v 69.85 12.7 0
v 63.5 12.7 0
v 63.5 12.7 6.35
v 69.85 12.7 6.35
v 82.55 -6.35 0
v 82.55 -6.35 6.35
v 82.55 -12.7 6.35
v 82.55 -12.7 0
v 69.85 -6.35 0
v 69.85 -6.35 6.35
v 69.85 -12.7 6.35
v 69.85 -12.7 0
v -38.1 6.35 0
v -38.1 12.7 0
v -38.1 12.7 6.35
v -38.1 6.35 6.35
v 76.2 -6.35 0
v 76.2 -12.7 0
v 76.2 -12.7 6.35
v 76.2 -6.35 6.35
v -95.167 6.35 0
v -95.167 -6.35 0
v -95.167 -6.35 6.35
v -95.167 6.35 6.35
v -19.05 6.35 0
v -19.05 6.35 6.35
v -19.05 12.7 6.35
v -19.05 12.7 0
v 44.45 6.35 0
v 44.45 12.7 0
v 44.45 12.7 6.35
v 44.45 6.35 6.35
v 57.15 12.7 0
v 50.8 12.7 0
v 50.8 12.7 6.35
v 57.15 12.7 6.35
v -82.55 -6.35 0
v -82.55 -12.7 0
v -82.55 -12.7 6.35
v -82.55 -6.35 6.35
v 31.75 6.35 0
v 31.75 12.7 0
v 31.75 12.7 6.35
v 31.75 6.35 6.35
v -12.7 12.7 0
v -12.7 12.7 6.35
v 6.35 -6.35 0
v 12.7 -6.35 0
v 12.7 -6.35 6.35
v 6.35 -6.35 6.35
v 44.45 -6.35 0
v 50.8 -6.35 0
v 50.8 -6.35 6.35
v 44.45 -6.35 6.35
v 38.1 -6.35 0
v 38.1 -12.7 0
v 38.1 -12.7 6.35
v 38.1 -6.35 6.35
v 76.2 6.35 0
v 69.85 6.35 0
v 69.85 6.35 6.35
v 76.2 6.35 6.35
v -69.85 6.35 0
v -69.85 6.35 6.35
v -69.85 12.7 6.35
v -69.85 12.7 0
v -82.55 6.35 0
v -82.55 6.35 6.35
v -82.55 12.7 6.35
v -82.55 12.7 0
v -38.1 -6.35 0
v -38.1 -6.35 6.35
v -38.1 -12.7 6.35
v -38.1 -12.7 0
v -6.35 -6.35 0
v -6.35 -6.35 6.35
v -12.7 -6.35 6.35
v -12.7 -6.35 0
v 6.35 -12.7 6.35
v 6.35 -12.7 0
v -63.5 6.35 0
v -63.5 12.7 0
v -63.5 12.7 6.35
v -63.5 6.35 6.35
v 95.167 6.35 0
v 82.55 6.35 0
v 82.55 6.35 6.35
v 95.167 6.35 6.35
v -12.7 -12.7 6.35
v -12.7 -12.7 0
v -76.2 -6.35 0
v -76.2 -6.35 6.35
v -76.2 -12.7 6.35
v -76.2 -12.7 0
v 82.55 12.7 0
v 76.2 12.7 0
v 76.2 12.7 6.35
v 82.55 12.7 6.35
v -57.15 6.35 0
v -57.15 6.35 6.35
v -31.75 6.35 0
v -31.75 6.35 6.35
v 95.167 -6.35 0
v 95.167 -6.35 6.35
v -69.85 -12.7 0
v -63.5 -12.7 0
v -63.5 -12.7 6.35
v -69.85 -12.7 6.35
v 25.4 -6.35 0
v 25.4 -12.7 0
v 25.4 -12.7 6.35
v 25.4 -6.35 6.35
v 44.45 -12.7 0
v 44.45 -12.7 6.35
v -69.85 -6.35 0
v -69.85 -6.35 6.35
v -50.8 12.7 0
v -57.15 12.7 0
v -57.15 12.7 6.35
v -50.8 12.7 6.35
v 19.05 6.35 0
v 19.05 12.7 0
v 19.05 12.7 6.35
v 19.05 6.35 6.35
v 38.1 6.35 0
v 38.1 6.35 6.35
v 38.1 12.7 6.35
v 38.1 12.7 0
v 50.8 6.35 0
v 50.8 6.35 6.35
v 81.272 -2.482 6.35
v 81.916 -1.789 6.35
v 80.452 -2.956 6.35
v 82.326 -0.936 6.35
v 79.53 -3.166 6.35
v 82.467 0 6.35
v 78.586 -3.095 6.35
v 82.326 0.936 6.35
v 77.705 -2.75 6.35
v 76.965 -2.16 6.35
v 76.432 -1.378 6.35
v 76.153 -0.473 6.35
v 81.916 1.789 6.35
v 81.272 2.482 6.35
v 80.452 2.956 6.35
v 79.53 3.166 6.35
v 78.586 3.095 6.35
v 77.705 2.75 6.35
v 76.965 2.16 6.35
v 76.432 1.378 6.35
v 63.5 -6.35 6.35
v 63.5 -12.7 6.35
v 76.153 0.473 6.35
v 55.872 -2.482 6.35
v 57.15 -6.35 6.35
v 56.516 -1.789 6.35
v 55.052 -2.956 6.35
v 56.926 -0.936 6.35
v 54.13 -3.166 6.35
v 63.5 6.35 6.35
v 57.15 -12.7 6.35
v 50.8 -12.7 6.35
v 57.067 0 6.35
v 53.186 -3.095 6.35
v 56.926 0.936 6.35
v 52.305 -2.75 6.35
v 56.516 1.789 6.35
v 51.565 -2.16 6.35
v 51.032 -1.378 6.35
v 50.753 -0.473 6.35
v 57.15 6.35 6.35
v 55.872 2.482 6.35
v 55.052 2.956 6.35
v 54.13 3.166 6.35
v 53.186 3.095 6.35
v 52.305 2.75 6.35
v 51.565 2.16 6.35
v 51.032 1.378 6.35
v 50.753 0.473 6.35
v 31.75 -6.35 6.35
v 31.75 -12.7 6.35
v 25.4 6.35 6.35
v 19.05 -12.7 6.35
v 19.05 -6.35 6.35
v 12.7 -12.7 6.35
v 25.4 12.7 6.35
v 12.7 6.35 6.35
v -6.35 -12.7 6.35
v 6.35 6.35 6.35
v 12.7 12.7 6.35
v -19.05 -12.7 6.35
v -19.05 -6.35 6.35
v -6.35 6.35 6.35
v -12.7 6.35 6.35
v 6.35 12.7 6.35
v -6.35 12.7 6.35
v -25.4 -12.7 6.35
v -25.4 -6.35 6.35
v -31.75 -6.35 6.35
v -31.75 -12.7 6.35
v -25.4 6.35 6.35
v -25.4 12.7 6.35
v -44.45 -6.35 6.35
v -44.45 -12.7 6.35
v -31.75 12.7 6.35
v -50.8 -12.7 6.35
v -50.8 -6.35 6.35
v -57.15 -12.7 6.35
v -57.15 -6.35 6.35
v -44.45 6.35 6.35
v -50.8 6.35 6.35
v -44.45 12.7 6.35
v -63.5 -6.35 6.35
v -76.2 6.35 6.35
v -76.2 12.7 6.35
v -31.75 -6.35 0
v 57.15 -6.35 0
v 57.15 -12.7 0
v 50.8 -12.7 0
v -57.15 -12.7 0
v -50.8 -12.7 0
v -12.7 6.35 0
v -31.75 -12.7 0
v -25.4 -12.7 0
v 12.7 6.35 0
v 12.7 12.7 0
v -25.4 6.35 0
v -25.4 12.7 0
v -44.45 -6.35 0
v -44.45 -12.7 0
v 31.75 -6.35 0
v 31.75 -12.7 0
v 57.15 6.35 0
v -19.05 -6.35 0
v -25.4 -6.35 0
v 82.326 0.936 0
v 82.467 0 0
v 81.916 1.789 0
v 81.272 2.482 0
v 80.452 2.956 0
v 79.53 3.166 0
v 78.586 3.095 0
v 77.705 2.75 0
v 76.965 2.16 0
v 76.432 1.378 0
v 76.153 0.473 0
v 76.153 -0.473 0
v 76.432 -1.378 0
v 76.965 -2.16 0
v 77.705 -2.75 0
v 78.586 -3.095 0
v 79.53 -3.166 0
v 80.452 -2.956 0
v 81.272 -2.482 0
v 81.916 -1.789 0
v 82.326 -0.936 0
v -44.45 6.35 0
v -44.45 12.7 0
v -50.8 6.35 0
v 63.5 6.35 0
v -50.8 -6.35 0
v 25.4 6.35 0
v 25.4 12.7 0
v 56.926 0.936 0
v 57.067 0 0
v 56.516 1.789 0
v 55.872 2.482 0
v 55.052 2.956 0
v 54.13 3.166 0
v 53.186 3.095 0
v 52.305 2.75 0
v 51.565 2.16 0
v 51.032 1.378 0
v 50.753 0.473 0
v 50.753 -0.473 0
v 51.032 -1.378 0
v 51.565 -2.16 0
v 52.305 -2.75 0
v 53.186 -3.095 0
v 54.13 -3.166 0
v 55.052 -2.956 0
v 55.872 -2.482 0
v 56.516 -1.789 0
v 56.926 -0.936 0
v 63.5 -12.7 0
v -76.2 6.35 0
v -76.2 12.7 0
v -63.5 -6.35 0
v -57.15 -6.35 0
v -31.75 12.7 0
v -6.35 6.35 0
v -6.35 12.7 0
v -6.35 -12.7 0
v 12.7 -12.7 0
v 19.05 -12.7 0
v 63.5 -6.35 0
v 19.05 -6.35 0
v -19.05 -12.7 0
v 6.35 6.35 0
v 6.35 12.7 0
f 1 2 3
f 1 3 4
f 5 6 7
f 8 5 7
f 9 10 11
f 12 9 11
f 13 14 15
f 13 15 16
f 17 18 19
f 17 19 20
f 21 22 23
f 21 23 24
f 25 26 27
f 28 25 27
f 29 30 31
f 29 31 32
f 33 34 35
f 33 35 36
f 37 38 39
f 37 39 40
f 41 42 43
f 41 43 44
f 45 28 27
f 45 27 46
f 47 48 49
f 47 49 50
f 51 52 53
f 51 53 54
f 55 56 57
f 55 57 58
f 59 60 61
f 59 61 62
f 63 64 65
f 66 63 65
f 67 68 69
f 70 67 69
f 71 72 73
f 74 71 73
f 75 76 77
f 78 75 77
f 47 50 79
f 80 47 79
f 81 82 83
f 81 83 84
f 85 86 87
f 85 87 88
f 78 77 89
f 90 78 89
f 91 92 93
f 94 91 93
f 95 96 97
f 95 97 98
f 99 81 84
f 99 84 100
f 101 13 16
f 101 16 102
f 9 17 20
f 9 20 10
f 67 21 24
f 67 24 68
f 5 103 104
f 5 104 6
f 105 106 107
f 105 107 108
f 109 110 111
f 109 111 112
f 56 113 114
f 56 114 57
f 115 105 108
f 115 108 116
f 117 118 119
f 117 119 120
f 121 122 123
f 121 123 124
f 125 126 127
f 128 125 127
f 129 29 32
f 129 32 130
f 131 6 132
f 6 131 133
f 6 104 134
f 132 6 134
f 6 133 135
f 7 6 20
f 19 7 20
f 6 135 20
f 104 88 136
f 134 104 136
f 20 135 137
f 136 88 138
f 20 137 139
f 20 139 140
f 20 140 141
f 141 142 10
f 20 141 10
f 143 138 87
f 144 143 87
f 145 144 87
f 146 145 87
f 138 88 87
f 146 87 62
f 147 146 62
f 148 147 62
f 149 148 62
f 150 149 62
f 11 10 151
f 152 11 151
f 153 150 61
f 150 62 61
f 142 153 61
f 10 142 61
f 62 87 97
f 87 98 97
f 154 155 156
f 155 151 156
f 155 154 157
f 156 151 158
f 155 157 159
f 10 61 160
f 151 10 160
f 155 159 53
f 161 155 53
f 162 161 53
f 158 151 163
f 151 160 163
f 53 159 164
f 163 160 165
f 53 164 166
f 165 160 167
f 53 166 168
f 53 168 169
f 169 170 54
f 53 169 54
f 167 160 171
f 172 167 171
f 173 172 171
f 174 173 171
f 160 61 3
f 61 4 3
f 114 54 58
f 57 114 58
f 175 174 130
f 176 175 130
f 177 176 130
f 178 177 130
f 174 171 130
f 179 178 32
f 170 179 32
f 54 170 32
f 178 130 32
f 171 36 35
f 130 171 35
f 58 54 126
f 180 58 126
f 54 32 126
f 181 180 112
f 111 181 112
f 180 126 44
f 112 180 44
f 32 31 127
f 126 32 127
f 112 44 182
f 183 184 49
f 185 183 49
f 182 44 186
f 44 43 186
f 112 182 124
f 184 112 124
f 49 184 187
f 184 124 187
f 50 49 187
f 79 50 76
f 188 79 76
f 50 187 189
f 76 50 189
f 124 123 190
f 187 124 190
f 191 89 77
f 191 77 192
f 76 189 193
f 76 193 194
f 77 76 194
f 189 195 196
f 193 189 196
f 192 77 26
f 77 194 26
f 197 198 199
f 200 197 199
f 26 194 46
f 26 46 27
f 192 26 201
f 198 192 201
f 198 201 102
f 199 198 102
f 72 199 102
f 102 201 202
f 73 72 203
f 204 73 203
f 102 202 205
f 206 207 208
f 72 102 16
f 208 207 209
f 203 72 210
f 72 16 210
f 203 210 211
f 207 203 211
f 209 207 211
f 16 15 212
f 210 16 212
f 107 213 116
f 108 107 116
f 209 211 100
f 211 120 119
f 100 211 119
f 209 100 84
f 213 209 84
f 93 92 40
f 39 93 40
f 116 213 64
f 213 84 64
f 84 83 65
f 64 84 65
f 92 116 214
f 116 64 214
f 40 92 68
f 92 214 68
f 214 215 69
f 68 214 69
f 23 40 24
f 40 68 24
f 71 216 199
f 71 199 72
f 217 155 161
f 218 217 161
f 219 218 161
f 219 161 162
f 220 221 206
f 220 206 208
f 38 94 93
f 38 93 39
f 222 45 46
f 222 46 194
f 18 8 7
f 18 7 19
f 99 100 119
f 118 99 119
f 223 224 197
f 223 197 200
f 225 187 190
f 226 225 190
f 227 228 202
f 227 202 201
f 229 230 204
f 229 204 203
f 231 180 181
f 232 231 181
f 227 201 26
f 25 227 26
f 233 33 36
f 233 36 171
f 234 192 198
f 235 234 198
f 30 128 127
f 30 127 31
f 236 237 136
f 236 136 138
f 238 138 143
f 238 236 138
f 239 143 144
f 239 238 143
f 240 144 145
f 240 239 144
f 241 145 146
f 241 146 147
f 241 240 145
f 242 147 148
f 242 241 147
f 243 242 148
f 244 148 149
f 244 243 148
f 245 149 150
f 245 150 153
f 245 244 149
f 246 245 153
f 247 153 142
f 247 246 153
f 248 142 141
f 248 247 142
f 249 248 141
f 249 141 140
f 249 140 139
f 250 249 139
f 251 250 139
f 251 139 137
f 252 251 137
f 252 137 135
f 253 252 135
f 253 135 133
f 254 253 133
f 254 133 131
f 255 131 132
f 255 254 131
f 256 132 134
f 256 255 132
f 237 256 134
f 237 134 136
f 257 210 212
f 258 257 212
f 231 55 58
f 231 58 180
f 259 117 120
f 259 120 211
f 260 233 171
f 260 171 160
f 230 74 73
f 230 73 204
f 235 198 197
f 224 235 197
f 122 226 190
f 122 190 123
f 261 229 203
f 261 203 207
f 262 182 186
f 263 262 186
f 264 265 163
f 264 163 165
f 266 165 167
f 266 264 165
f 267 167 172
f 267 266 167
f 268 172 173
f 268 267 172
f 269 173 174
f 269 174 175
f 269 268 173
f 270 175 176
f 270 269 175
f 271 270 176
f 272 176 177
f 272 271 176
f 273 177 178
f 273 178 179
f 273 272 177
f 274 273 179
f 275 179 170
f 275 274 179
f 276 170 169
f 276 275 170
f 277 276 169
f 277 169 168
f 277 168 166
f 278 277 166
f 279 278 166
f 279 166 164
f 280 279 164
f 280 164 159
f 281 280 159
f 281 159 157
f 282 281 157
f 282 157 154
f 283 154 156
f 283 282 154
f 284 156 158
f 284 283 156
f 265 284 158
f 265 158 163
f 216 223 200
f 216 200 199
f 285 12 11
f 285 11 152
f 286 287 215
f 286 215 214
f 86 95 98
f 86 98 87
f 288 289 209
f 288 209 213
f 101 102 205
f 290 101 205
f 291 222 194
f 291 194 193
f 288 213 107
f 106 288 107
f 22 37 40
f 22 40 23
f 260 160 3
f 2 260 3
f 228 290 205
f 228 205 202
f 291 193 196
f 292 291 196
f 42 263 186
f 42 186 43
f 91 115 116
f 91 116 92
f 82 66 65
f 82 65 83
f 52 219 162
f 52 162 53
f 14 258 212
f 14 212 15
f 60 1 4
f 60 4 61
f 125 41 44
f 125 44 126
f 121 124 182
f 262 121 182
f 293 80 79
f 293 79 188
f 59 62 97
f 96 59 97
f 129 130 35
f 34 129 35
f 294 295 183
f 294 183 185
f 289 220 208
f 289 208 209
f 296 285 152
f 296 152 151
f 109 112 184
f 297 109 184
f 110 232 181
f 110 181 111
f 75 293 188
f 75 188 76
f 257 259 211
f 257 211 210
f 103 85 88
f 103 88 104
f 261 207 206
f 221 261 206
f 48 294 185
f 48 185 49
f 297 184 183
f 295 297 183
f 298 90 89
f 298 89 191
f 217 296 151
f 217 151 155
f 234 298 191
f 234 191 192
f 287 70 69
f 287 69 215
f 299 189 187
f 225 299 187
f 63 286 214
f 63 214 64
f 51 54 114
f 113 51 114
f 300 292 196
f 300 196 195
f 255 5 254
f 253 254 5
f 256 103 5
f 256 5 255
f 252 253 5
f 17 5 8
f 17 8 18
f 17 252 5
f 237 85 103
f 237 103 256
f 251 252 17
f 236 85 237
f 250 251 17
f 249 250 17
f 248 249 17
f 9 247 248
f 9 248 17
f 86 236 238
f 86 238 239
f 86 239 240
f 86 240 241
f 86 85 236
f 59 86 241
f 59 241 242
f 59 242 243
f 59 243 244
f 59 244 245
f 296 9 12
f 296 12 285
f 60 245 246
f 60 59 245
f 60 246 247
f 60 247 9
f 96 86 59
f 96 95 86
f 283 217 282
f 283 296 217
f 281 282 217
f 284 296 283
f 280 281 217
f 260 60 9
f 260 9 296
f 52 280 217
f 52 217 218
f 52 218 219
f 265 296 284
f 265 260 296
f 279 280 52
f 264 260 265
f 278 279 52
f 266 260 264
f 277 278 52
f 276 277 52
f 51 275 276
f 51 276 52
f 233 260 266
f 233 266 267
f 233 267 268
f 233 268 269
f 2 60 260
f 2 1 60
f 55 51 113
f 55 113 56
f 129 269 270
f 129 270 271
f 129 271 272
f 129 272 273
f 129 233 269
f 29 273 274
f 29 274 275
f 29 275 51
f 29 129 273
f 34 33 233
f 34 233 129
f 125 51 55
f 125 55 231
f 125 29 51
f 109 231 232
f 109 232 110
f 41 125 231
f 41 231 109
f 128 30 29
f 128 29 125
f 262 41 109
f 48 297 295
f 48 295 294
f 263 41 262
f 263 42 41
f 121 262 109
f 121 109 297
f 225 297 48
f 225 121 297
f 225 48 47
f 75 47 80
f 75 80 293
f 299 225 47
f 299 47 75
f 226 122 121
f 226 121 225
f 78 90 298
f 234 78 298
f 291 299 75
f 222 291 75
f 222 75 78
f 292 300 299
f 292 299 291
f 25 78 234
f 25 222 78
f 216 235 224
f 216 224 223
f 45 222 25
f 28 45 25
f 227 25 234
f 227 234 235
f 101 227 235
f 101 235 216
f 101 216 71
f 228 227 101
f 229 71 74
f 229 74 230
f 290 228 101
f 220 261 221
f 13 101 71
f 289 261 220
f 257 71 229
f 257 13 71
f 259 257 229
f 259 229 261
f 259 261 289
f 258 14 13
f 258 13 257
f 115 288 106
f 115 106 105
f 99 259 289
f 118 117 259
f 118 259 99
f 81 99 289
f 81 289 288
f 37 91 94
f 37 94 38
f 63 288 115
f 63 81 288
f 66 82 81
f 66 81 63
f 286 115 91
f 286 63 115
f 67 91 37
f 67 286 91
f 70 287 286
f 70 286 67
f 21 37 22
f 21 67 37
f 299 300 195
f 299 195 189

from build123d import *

# Parameters (mm, degrees)
SKETCH1_R           = 3.175
BOSS_EXTRUDE1_DEPTH = 6.35


with BuildPart() as part:
    # Sketch1 → Boss-Extrude1 (new body)
    with BuildSketch(Plane.XY):
        Polygon((-82.55, 12.7), (-76.2, 12.7), (-76.2, 6.35), (-69.85, 6.35), (-69.85, 12.7), (-63.5, 12.7), (-63.5, 6.35), (-57.15, 6.35), (-57.15, 12.7), (-50.8, 12.7), (-50.8, 6.35), (-44.45, 6.35), (-44.45, 12.7), (-38.1, 12.7), (-38.1, 6.35), (-31.75, 6.35), (-31.75, 12.7), (-25.4, 12.7), (-25.4, 6.35), (-19.05, 6.35), (-19.05, 12.7), (-12.7, 12.7), (-12.7, 6.35), (-6.35, 6.35), (-6.35, 12.7), (6.35, 12.7), (6.35, 6.35), (12.7, 6.35), (12.7, 12.7), (19.05, 12.7), (19.05, 6.35), (25.4, 6.35), (25.4, 12.7), (31.75, 12.7), (31.75, 6.35), (38.1, 6.35), (38.1, 12.7), (44.45, 12.7), (44.45, 6.35), (50.8, 6.35), (50.8, 12.7), (57.15, 12.7), (57.15, 6.35), (63.5, 6.35), (63.5, 12.7), (69.85, 12.7), (69.85, 6.35), (76.2, 6.35), (76.2, 12.7), (82.55, 12.7), (82.55, 6.35), (95.167491893, 6.35), (95.167491893, -6.35), (82.55, -6.35), (82.55, -12.7), (76.2, -12.7), (76.2, -6.35), (69.85, -6.35), (69.85, -12.7), (63.5, -12.7), (63.5, -6.35), (57.15, -6.35), (57.15, -12.7), (50.8, -12.7), (50.8, -6.35), (44.45, -6.35), (44.45, -12.7), (38.1, -12.7), (38.1, -6.35), (31.75, -6.35), (31.75, -12.7), (25.4, -12.7), (25.4, -6.35), (19.05, -6.35), (19.05, -12.7), (12.7, -12.7), (12.7, -6.35), (6.35, -6.35), (6.35, -12.7), (-6.35, -12.7), (-6.35, -6.35), (-12.7, -6.35), (-12.7, -12.7), (-19.05, -12.7), (-19.05, -6.35), (-25.4, -6.35), (-25.4, -12.7), (-31.75, -12.7), (-31.75, -6.35), (-38.1, -6.35), (-38.1, -12.7), (-44.45, -12.7), (-44.45, -6.35), (-50.8, -6.35), (-50.8, -12.7), (-57.15, -12.7), (-57.15, -6.35), (-63.5, -6.35), (-63.5, -12.7), (-69.85, -12.7), (-69.85, -6.35), (-76.2, -6.35), (-76.2, -12.7), (-82.55, -12.7), (-82.55, -6.35), (-95.167491893, -6.35), (-95.167491893, 6.35), (-82.55, 6.35), align=None)
        with Locations((79.292491893, 0)):
            Circle(SKETCH1_R, mode=Mode.SUBTRACT)
        with Locations((53.892491893, 0)):
            Circle(SKETCH1_R, mode=Mode.SUBTRACT)
    extrude(amount=BOSS_EXTRUDE1_DEPTH)


solid = part.part
